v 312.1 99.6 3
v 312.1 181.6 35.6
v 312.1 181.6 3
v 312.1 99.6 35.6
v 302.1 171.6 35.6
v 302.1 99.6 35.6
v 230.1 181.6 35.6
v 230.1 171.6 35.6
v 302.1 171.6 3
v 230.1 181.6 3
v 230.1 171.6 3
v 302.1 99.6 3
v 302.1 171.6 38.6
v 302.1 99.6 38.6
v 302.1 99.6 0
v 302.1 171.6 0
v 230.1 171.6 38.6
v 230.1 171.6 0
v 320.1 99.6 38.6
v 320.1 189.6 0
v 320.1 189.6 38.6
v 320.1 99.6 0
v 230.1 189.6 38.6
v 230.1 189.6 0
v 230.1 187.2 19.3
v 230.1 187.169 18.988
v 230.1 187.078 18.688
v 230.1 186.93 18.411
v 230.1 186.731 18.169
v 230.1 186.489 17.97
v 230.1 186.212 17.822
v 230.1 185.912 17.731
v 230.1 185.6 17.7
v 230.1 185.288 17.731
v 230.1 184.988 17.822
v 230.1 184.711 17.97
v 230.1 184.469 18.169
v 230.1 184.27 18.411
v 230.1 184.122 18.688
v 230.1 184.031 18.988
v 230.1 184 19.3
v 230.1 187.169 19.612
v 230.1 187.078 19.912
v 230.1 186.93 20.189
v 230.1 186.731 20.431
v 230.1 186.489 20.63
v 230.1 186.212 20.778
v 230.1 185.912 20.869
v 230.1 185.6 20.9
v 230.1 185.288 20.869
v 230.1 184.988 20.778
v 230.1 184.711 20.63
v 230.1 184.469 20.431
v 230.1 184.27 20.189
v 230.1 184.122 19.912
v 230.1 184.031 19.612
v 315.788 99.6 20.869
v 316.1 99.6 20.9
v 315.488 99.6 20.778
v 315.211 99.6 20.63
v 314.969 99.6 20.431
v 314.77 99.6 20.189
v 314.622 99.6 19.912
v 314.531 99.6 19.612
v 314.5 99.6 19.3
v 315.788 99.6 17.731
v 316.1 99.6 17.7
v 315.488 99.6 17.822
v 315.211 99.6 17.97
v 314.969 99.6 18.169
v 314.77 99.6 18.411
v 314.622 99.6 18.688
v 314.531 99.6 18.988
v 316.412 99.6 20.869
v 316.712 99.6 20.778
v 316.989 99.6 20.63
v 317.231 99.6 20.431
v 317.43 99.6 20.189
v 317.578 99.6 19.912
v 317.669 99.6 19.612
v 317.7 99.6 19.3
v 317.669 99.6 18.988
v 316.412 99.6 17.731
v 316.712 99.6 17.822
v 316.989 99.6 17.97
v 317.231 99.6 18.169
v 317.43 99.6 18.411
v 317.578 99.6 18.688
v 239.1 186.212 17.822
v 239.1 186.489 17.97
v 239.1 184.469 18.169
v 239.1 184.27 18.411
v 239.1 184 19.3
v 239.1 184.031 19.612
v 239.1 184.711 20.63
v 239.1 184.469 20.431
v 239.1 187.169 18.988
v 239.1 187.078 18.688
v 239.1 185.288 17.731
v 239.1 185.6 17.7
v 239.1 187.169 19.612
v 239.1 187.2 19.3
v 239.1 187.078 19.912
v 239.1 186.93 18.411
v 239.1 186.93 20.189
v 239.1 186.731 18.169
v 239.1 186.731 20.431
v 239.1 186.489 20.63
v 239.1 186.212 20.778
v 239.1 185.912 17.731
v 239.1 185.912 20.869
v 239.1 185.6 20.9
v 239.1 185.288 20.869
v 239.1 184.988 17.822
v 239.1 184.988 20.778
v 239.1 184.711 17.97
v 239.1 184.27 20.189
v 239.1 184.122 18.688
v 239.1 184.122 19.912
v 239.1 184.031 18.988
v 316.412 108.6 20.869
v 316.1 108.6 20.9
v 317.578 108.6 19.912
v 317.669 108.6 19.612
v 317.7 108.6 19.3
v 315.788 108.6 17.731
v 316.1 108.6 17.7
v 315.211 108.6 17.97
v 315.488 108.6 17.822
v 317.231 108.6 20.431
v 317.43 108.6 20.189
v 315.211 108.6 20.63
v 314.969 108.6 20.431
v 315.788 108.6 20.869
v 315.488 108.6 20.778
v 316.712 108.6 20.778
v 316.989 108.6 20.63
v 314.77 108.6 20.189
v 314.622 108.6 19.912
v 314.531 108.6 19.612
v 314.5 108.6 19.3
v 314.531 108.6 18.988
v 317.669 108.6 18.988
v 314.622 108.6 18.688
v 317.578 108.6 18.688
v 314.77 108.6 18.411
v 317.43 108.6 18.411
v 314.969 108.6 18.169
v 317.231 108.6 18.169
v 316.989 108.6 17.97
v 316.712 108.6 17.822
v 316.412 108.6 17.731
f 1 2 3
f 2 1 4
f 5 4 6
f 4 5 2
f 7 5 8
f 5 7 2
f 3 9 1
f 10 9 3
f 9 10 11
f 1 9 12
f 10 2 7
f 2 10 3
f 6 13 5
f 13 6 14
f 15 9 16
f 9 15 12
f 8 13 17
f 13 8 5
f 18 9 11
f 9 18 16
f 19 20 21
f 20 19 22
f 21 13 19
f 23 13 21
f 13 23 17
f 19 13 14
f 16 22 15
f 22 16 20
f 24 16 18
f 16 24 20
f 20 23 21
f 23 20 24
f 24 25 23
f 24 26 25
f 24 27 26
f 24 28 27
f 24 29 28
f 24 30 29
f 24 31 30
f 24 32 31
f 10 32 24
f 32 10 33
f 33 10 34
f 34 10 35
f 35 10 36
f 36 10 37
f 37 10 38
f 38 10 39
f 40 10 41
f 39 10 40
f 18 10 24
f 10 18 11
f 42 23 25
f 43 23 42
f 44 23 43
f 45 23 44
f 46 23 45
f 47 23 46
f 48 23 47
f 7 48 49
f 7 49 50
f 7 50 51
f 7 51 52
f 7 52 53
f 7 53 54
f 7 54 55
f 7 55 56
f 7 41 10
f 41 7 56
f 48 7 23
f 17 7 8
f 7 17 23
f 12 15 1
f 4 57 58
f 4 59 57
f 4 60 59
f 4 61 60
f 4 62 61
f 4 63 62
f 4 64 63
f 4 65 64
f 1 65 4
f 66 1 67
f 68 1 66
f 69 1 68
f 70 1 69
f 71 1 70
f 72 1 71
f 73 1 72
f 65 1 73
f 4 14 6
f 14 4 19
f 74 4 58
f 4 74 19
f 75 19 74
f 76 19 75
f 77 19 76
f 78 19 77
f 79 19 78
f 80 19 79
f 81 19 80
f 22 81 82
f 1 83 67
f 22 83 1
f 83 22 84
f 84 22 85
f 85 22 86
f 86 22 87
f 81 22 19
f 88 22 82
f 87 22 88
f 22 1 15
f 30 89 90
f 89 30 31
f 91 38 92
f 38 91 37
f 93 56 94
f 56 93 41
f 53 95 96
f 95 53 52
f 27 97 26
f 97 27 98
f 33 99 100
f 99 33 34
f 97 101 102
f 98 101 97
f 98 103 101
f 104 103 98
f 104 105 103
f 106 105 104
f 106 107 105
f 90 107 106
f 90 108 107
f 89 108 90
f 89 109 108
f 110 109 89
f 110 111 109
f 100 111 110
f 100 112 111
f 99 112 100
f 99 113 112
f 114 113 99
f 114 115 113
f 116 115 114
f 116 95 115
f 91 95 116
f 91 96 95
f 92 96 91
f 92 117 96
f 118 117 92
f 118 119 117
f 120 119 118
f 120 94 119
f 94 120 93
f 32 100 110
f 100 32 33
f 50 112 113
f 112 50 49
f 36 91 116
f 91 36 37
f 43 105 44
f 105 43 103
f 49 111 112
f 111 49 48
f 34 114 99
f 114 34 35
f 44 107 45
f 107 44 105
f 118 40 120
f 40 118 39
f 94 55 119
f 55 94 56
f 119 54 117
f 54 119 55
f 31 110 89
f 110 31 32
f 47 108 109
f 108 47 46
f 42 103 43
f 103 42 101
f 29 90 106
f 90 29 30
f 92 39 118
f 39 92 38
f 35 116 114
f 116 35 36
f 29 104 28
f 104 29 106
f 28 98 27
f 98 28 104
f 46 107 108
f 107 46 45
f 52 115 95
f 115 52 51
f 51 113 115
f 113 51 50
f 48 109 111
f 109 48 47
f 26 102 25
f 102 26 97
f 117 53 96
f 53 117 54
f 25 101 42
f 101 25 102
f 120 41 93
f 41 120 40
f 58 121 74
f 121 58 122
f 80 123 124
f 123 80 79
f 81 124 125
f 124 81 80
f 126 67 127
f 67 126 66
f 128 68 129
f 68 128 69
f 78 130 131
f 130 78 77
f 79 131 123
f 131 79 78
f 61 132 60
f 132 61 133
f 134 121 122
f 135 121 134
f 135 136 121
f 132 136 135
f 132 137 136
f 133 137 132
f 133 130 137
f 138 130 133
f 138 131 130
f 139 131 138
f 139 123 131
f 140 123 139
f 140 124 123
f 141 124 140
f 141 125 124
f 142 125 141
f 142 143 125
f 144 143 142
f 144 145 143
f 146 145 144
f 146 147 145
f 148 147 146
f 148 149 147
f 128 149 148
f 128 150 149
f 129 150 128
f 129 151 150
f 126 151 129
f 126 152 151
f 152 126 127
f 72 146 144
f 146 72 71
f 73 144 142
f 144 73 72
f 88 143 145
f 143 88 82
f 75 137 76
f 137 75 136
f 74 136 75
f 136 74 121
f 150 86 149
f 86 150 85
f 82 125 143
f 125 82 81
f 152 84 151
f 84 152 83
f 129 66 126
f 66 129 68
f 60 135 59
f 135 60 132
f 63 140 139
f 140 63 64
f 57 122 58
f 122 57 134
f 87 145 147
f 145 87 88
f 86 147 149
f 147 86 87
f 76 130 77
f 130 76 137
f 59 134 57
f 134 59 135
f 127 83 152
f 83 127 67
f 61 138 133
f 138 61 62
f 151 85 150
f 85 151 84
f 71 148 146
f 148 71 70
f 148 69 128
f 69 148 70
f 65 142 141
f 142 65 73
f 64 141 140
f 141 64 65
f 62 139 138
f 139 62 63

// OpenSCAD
// =====================================================================
//  FULL PERIMETER DISPLAY FRAME  —  parametric (OpenSCAD)
//
//  C-channel "picture frame" that grips a 27" flat-panel display edge for
//  transport inside a converted Rimowa / hard case.  The full ring is too
//  big to print whole, so set `part` to render ONE printable piece at a time.
//
//  Variable names match generate_frame.py exactly. Edit numbers here and the
//  Python STL generator together (or just re-run generate_frame.py).
//
//  Render a part:  set `part` + `seg` below, then F6, then export STL.
// =====================================================================

/* [What to render] */
// "full", "corner", "edge_top", "edge_bot", "edge_left", "edge_right", "pin"
part = "corner";
// which corner: 1=TR 2=TL 3=BR 4=BL   |   which edge segment: 1..N
seg  = 1;

/* [Display] */
panel_w = 623;   // width  (mm)
panel_h = 362;   // height (mm)
panel_d = 31;    // edge thickness (mm)

/* [Fit] */
clr   = 0.6;     // in-plane gap each side (mm)
clr_z = 0.8;     // per-face gap (mm)

/* [Profile] */
engage = 10;     // lip overlap / groove depth (mm)
lip_z  = 3;      // front/back lip thickness (mm)
wall   = 8;      // outer wall (mm)

/* [Print / segmentation] */
bed        = 220;  // bed size (mm, square)
bed_margin = 10;   // keep inside bed (mm)
corner_leg = 90;   // corner L leg length (mm)

/* [Joints] */
pin_dia   = 3.2;   // alignment-pin hole dia (mm)
pin_depth = 9;     // hole depth each face (mm)

// ---- derived --------------------------------------------------------
slot_z      = panel_d + 2*clr_z;
frame_depth = slot_z + 2*lip_z;
border      = wall + engage;
outer_w     = panel_w + 2*clr + 2*wall;
outer_h     = panel_h + 2*clr + 2*wall;
opening_w   = panel_w + 2*clr - 2*engage;
opening_h   = panel_h + 2*clr - 2*engage;
slot_w      = panel_w + 2*clr;
slot_h      = panel_h + 2*clr;
bed_usable  = bed - bed_margin;
EPS         = 1;
Zc          = frame_depth/2;

Y_TOP   =  (outer_h/2 - wall/2);
Y_BOT   = -(outer_h/2 - wall/2);
X_RIGHT =  (outer_w/2 - wall/2);
X_LEFT  = -(outer_w/2 - wall/2);

h_run = outer_w - 2*corner_leg;
v_run = outer_h - 2*corner_leg;
nh = max(1, ceil(h_run/bed_usable));
nv = max(1, ceil(v_run/bed_usable));

// ---- modules --------------------------------------------------------
module frame_full() {
    difference() {
        translate([0,0,Zc]) cube([outer_w, outer_h, frame_depth], center=true);
        translate([0,0,Zc]) cube([opening_w, opening_h, frame_depth+EPS], center=true);
        // groove ring (central Z band, open toward centre)
        difference() {
            translate([0,0,Zc]) cube([slot_w, slot_h, slot_z], center=true);
            translate([0,0,Zc]) cube([opening_w, opening_h, slot_z+EPS], center=true);
        }
    }
}

module pin_hole(p, axis) {
    translate(p) rotate(axis=="x" ? [0,90,0] : [90,0,0])
        cylinder(h = 2*pin_depth, d = pin_dia, center = true, $fn = 32);
}

module corner(sx, sy) {
    cx = sx*outer_w/2;  cy = sy*outer_h/2;
    x_cut = cx - sx*corner_leg;
    y_cut = cy - sy*corner_leg;
    y_band = sy > 0 ? Y_TOP : Y_BOT;
    x_band = sx > 0 ? X_RIGHT : X_LEFT;
    difference() {
        intersection() {
            frame_full();
            union() {
                translate([cx - sx*corner_leg/2, cy - sy*(border/2 - EPS/2), Zc])
                    cube([corner_leg, border+EPS, frame_depth+EPS], center=true);
                translate([cx - sx*(border/2 - EPS/2), cy - sy*corner_leg/2, Zc])
                    cube([border+EPS, corner_leg, frame_depth+EPS], center=true);
            }
        }
        pin_hole([x_cut, y_band, Zc], "x");
        pin_hole([x_band, y_cut, Zc], "y");
    }
}

module edge_h(sign, idx) {       // top (sign=1) / bottom (sign=-1)
    a = -h_run/2 + (idx-1)*h_run/nh;
    b = -h_run/2 +  idx   *h_run/nh;
    cy = sign*outer_h/2;
    y_band = sign > 0 ? Y_TOP : Y_BOT;
    difference() {
        intersection() {
            frame_full();
            translate([(a+b)/2, cy - sign*(border/2 - EPS/2), Zc])
                cube([abs(b-a), border+EPS, frame_depth+EPS], center=true);
        }
        pin_hole([a, y_band, Zc], "x");
        pin_hole([b, y_band, Zc], "x");
    }
}

module edge_v(sign, idx) {       // right (sign=1) / left (sign=-1)
    a = -v_run/2 + (idx-1)*v_run/nv;
    b = -v_run/2 +  idx   *v_run/nv;
    cx = sign*outer_w/2;
    x_band = sign > 0 ? X_RIGHT : X_LEFT;
    difference() {
        intersection() {
            frame_full();
            translate([cx - sign*(border/2 - EPS/2), (a+b)/2, Zc])
                cube([border+EPS, abs(b-a), frame_depth+EPS], center=true);
        }
        pin_hole([x_band, a, Zc], "y");
        pin_hole([x_band, b, Zc], "y");
    }
}

module pin() cylinder(h = 2*pin_depth - 1, d = pin_dia - 0.2, $fn = 32);

// ---- dispatch -------------------------------------------------------
if      (part == "full")       frame_full();
else if (part == "corner")     corner(seg==1||seg==3 ? 1 : -1, seg<=2 ? 1 : -1);
else if (part == "edge_top")   edge_h( 1, seg);
else if (part == "edge_bot")   edge_h(-1, seg);
else if (part == "edge_right") edge_v( 1, seg);
else if (part == "edge_left")  edge_v(-1, seg);
else if (part == "pin")        pin();

echo(str("frame outer = ", outer_w, " x ", outer_h, " x ", frame_depth, " mm"));
echo(str("segments: top/bot = ", nh, " each, sides = ", nv, " each"));
